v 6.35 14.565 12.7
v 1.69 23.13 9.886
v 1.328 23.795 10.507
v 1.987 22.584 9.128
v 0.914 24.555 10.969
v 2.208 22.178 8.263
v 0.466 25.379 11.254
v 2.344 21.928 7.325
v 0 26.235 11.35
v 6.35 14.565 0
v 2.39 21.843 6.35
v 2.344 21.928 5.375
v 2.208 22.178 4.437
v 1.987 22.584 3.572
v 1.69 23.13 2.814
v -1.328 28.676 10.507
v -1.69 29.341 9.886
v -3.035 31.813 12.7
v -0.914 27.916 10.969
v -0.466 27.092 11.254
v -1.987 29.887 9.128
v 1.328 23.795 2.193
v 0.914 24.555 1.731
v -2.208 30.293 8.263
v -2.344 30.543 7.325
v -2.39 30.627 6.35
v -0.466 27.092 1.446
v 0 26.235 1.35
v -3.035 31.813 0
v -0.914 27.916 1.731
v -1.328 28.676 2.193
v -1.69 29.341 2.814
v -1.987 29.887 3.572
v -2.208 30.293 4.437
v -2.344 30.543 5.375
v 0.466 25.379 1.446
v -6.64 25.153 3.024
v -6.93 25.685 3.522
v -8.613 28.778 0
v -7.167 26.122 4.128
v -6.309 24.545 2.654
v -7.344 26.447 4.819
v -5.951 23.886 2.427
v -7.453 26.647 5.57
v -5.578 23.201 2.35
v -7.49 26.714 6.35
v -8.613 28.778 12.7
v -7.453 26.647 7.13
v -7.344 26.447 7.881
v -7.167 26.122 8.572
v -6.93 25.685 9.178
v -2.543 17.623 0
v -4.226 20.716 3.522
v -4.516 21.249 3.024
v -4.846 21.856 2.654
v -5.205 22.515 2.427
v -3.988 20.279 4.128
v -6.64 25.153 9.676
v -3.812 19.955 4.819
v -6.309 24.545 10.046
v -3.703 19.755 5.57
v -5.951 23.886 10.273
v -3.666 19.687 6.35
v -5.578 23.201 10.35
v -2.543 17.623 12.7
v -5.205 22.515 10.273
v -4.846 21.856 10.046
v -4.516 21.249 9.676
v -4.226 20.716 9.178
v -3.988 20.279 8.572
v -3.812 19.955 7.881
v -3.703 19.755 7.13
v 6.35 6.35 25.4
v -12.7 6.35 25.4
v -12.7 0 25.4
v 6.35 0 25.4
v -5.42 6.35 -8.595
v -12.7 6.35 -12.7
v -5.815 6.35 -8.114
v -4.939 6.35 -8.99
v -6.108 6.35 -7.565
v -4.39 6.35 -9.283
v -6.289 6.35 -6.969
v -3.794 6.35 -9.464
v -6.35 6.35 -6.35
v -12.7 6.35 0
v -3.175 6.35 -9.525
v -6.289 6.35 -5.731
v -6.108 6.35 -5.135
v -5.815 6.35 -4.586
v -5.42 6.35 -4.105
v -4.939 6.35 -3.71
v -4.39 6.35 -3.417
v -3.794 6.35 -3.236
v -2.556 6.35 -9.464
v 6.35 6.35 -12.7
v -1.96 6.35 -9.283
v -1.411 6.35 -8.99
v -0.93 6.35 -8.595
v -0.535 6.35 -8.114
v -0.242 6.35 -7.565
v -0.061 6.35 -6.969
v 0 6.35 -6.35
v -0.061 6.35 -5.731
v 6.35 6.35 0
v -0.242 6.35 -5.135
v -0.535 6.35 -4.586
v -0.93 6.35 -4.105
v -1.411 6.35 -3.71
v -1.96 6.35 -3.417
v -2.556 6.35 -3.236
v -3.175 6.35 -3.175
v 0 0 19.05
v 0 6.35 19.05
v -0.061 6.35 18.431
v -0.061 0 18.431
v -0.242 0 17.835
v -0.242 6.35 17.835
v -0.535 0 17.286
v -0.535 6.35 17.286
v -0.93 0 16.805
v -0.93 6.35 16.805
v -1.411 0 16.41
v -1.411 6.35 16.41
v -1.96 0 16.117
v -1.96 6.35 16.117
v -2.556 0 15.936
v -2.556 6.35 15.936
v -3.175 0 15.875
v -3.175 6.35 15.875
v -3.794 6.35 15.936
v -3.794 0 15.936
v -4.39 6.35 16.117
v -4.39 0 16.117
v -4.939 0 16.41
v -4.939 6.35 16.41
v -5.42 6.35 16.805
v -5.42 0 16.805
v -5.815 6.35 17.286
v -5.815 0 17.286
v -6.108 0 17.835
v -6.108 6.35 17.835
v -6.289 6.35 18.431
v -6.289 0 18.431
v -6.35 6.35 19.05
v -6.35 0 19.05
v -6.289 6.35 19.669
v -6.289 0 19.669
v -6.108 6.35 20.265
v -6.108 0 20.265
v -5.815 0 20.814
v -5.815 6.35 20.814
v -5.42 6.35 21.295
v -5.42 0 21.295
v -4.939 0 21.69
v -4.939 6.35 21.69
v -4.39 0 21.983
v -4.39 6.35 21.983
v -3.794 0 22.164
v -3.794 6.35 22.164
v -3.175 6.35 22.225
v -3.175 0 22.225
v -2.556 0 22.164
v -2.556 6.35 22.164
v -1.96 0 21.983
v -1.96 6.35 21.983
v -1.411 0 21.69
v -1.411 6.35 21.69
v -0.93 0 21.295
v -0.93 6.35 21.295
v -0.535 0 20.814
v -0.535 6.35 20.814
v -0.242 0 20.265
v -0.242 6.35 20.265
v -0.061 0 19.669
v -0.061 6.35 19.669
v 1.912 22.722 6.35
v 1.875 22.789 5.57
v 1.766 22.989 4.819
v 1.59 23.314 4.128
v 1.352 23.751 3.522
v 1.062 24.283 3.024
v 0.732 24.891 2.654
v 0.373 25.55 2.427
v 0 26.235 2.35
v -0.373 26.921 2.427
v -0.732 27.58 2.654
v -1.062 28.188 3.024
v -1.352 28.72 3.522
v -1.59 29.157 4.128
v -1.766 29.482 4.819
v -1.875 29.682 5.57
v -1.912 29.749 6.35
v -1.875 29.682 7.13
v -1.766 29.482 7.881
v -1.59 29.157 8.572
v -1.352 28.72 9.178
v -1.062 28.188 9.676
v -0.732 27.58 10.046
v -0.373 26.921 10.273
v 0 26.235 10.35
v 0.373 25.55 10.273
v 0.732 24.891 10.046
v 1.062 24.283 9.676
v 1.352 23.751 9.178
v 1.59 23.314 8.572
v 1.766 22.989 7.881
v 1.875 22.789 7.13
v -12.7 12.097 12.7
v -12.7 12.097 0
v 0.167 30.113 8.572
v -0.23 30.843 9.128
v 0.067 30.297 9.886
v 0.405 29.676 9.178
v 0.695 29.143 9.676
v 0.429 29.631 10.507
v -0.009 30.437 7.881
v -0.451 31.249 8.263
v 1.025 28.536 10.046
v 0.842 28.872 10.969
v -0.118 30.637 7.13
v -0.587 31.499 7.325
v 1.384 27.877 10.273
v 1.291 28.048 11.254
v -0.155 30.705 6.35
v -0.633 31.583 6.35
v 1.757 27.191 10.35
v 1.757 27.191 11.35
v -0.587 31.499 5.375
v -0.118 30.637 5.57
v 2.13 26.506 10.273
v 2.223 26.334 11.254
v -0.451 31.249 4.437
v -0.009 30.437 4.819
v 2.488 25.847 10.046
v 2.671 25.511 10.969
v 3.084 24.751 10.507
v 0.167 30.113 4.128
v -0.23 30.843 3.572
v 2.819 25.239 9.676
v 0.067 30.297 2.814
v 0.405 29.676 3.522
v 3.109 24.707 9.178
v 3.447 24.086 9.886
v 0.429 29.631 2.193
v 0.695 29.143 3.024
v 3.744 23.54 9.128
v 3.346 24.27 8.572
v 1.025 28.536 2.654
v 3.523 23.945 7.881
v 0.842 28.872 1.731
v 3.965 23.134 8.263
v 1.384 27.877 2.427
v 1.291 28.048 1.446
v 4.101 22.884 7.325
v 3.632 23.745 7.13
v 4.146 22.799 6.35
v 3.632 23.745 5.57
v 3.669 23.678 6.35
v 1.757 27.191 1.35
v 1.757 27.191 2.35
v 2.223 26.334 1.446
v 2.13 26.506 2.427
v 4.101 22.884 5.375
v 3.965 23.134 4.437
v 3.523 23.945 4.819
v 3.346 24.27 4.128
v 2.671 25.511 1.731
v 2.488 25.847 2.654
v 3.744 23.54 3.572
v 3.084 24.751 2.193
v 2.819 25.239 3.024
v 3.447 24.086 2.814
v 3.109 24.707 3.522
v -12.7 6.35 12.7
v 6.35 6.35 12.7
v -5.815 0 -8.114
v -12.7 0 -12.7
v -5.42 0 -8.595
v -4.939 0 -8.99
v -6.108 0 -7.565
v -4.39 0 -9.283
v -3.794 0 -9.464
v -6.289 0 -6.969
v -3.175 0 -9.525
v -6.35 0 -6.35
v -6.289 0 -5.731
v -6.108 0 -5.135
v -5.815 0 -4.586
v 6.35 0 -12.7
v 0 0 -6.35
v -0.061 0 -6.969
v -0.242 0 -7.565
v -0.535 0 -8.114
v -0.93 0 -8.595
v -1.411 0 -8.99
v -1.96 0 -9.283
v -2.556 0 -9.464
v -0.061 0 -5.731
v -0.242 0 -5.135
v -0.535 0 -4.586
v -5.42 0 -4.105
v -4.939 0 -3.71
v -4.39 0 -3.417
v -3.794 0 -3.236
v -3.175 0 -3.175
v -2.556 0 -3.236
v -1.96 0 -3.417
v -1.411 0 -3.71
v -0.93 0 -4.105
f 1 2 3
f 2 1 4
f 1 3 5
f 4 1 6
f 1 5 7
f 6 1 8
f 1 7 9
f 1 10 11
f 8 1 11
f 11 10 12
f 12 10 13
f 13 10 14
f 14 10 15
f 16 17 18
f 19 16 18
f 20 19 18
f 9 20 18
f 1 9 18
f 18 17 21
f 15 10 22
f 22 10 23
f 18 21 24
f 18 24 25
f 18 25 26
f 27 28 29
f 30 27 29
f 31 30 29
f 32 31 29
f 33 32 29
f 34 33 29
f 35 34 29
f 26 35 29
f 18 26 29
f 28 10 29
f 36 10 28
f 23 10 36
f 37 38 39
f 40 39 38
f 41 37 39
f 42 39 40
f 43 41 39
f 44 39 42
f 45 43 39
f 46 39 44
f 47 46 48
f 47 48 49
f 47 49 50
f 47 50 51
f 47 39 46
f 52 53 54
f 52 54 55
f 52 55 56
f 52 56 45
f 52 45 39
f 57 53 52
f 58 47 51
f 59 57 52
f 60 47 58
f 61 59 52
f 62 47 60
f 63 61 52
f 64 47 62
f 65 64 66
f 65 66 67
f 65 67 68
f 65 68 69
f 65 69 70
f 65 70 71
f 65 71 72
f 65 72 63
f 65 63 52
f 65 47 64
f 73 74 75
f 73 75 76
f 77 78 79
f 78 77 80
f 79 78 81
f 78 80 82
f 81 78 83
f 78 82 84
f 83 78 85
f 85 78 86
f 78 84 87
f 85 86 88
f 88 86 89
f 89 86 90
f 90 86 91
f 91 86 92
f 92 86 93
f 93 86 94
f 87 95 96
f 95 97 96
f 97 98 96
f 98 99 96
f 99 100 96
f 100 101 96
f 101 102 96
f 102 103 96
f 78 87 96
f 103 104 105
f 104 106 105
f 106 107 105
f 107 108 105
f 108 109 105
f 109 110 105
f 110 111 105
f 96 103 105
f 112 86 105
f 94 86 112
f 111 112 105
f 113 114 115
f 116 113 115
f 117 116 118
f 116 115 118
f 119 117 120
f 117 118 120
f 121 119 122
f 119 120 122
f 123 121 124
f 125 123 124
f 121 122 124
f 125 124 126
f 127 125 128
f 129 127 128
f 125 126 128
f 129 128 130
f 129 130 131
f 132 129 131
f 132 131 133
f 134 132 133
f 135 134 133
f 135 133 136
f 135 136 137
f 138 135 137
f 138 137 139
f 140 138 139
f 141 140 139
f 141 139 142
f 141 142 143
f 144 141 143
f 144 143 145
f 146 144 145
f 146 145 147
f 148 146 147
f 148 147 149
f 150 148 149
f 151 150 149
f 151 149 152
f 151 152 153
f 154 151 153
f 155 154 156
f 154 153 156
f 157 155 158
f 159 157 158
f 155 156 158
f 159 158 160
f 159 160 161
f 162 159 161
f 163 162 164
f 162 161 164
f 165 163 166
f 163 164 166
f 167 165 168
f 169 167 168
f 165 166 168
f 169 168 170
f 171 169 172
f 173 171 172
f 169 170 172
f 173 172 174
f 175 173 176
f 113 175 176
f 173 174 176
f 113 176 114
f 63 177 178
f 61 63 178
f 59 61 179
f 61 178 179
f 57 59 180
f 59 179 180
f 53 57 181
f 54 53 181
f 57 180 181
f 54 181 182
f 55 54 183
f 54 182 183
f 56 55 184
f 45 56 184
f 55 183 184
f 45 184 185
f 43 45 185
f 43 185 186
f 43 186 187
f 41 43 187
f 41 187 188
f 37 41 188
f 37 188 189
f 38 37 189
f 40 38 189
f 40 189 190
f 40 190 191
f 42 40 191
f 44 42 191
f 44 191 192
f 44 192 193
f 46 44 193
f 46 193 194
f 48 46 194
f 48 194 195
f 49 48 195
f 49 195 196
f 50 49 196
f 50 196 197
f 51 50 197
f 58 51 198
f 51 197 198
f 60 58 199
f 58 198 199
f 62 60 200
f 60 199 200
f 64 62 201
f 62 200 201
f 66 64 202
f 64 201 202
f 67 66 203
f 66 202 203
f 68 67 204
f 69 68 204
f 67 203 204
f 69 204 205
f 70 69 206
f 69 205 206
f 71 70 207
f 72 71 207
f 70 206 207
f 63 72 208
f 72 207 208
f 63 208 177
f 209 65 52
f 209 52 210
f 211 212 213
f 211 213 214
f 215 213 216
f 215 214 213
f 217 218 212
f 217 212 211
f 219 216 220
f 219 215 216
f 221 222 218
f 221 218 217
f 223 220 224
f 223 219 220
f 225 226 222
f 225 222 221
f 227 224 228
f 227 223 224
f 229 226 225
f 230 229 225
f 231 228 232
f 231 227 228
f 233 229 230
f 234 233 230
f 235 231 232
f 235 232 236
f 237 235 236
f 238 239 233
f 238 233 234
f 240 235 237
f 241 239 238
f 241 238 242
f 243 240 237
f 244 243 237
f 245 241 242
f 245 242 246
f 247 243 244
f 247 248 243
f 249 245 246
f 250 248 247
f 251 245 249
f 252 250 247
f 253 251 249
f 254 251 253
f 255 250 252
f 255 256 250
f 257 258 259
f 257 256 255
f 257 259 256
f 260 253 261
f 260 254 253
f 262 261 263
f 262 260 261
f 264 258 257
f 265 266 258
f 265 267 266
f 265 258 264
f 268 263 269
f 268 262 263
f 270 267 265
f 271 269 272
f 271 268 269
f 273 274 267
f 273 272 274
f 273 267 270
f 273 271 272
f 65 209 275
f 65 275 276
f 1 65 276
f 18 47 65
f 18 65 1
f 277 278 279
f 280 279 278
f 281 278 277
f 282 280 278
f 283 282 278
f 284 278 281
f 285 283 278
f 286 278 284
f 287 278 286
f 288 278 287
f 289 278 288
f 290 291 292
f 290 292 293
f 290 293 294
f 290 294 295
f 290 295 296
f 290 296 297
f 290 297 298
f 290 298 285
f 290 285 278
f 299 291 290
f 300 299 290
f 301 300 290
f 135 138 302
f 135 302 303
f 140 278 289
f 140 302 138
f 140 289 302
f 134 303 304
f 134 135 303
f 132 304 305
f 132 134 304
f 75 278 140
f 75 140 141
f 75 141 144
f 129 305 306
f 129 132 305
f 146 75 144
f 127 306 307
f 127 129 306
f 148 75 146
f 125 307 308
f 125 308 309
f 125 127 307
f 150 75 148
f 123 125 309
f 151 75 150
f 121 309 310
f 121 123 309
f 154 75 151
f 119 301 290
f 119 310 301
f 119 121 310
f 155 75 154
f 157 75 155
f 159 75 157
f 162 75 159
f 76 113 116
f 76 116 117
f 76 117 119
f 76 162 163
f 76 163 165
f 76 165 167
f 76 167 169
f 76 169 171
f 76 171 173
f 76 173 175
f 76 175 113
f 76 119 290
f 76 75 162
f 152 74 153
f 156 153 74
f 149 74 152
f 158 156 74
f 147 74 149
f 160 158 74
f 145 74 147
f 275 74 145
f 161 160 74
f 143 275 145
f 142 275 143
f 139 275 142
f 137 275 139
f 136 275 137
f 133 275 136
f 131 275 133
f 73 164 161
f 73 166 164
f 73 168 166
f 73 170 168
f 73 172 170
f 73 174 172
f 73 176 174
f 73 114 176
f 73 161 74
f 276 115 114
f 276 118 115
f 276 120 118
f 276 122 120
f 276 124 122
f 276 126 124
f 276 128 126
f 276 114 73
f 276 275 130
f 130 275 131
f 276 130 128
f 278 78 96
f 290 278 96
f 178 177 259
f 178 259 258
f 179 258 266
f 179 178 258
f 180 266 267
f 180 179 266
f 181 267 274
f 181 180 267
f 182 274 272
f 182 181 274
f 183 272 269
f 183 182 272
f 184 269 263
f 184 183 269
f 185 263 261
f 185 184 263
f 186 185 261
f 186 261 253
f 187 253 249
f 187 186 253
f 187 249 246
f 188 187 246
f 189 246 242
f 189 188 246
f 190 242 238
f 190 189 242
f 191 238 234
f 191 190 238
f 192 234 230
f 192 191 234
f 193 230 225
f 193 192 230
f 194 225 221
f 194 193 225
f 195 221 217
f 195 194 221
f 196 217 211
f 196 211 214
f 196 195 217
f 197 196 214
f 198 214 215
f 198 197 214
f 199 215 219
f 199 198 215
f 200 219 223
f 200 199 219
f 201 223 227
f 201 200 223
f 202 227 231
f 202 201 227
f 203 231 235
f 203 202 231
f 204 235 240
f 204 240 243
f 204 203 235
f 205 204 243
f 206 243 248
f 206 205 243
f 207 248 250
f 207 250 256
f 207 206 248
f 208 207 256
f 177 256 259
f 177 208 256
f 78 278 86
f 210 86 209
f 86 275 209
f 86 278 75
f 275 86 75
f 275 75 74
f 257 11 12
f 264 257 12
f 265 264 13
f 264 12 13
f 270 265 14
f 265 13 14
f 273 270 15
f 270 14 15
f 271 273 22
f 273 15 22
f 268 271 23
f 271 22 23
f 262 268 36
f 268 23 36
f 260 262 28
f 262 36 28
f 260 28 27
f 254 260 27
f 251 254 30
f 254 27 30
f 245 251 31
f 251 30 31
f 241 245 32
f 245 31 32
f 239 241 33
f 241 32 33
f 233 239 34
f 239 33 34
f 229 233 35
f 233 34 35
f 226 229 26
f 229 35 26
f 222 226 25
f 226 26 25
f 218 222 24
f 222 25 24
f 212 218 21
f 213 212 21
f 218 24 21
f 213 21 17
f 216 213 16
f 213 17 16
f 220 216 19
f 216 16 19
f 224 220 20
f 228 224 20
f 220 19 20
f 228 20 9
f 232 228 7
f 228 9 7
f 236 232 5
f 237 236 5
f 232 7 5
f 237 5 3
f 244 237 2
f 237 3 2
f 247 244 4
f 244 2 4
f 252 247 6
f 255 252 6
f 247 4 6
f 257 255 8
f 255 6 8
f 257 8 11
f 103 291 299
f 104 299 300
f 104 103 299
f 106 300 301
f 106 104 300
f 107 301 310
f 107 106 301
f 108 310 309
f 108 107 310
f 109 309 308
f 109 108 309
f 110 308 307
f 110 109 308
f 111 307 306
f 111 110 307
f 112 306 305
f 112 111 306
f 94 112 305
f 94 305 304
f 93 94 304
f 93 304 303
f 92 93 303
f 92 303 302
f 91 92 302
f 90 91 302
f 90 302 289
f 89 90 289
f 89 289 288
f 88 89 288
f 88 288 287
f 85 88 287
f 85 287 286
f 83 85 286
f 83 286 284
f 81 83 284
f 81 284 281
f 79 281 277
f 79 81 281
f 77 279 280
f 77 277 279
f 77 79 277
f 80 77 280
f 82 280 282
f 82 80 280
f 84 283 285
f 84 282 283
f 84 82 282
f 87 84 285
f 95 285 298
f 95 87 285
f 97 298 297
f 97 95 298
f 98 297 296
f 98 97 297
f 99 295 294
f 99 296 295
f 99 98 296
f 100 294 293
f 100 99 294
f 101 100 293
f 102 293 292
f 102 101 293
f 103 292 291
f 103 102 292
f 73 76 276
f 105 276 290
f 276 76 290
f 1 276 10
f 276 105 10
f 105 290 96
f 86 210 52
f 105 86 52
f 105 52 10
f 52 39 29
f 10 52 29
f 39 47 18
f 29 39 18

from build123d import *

# Parameters (mm, degrees)
BOSS_EXTRUDE1_DEPTH = 12.7
CUT_EXTRUDE3_REACH  = 25.694
SKETCH2_R           = 4
SKETCH4_R           = 5
SKETCH4_R_2         = 4
BOSS_EXTRUDE2_DEPTH = 2
CUT_EXTRUDE4_REACH  = 14.7
SKETCH5_W           = 6.909894264
SKETCH5_H           = 12.7
SKETCH7_W           = 19.05
SKETCH7_H           = 6.35
BOSS_EXTRUDE3_DEPTH = 12.7
CUT_EXTRUDE5_DEPTH  = 12.7
SKETCH9_R           = 3.175
CUT_EXTRUDE6_DEPTH  = 12.7
SKETCH11_W          = 6.35
SKETCH11_H          = 14.564534892
CUT_EXTRUDE7_DEPTH  = 12.7


with BuildPart() as part:
    # Sketch1 → Boss-Extrude1 (new body)
    with BuildSketch(Plane.XY):
        Polygon((-12.7, 0), (12.7, 0), (12.7, 2.893589299), (-12.7, 49.577371669), align=None)
    extrude(amount=BOSS_EXTRUDE1_DEPTH)

    # Sketch2 → Cut-Extrude3 (cut, up to next)
    with BuildSketch(Plane(origin=(11.013915285, 5.992518901, 0), x_dir=(0.477925491, -0.878400379, 0), z_dir=(0.878400379, 0.477925491, 0)), mode=Mode.PRIVATE) as cut_extrude3_sk1:
        with Locations((-23.045255988, -6.35)):
            Circle(SKETCH2_R)
    cut_extrude3_tool1 = extrude(cut_extrude3_sk1.sketch, amount=-CUT_EXTRUDE3_REACH, mode=Mode.PRIVATE) & part.part
    add(cut_extrude3_tool1.solids().sort_by_distance((0, 26.23548, 6.35))[0], mode=Mode.SUBTRACT)

    # Sketch4 → Boss-Extrude2 (add)
    with BuildSketch(Plane(origin=(11.013915285, 5.992518901, 0), x_dir=(0.477925491, -0.878400379, 0), z_dir=(0.878400379, 0.477925491, 0))):
        with Locations((-23.045255988, -6.35)):
            Circle(SKETCH4_R)
        with Locations((-23.045255988, -6.35)):
            Circle(SKETCH4_R_2, mode=Mode.SUBTRACT)
    extrude(amount=BOSS_EXTRUDE2_DEPTH)

    # Sketch5 → Cut-Extrude4 (cut, up to next)
    with BuildSketch(Plane.XY.offset(12.7), mode=Mode.PRIVATE) as cut_extrude4_sk1:
        with Locations((-9.245052868, 43.227371669)):
            Rectangle(SKETCH5_W, SKETCH5_H)
    cut_extrude4_tool1 = extrude(cut_extrude4_sk1.sketch, amount=-CUT_EXTRUDE4_REACH, mode=Mode.PRIVATE) & part.part
    add(cut_extrude4_tool1.solids().sort_by_distance((-9.245053, 43.227372, 12.7))[0], mode=Mode.SUBTRACT)

    # Sketch7 → Boss-Extrude3 (add)
    with BuildSketch(Plane.XY.offset(12.7)):
        with Locations((-3.175, 3.175)):
            Rectangle(SKETCH7_W, SKETCH7_H)
    boss_extrude3 = extrude(amount=BOSS_EXTRUDE3_DEPTH)

    # Sketch8 → Cut-Extrude5 (cut)
    with BuildSketch(Plane.XY.offset(12.7)):
        Polygon((-8.612669272, 28.778496019), (-2.543015535, 17.622811212), (-12.7, 12.096536512), (-12.7, 26.554635929), align=None)
    extrude(amount=-CUT_EXTRUDE5_DEPTH, mode=Mode.SUBTRACT)

    # Sketch9 → Cut-Extrude6 (cut)
    with BuildSketch(Plane(origin=(0, 6.35, 0), x_dir=(1, 0, 0), z_dir=(0, 1, 0))):
        with Locations((-3.175, -19.05)):
            Circle(SKETCH9_R)
    cut_extrude6 = extrude(amount=-CUT_EXTRUDE6_DEPTH, mode=Mode.SUBTRACT)

    # Mirror1: Boss-Extrude3, Cut-Extrude6 across plane
    add(boss_extrude3.mirror(Plane.XY.offset(6.35)))
    add(cut_extrude6.mirror(Plane.XY.offset(6.35)), mode=Mode.SUBTRACT)

    # Sketch11 → Cut-Extrude7 (cut)
    with BuildSketch(Plane.XY.offset(12.7)):
        Polygon((-12.7, 26.554635929), (-3.034826868, 31.813322888), (-5.790105736, 36.877371669), (-12.7, 36.877371669), align=None)
        with Locations((9.525, 7.282267446)):
            Rectangle(SKETCH11_W, SKETCH11_H)
    extrude(amount=-CUT_EXTRUDE7_DEPTH, mode=Mode.SUBTRACT)


solid = part.part
